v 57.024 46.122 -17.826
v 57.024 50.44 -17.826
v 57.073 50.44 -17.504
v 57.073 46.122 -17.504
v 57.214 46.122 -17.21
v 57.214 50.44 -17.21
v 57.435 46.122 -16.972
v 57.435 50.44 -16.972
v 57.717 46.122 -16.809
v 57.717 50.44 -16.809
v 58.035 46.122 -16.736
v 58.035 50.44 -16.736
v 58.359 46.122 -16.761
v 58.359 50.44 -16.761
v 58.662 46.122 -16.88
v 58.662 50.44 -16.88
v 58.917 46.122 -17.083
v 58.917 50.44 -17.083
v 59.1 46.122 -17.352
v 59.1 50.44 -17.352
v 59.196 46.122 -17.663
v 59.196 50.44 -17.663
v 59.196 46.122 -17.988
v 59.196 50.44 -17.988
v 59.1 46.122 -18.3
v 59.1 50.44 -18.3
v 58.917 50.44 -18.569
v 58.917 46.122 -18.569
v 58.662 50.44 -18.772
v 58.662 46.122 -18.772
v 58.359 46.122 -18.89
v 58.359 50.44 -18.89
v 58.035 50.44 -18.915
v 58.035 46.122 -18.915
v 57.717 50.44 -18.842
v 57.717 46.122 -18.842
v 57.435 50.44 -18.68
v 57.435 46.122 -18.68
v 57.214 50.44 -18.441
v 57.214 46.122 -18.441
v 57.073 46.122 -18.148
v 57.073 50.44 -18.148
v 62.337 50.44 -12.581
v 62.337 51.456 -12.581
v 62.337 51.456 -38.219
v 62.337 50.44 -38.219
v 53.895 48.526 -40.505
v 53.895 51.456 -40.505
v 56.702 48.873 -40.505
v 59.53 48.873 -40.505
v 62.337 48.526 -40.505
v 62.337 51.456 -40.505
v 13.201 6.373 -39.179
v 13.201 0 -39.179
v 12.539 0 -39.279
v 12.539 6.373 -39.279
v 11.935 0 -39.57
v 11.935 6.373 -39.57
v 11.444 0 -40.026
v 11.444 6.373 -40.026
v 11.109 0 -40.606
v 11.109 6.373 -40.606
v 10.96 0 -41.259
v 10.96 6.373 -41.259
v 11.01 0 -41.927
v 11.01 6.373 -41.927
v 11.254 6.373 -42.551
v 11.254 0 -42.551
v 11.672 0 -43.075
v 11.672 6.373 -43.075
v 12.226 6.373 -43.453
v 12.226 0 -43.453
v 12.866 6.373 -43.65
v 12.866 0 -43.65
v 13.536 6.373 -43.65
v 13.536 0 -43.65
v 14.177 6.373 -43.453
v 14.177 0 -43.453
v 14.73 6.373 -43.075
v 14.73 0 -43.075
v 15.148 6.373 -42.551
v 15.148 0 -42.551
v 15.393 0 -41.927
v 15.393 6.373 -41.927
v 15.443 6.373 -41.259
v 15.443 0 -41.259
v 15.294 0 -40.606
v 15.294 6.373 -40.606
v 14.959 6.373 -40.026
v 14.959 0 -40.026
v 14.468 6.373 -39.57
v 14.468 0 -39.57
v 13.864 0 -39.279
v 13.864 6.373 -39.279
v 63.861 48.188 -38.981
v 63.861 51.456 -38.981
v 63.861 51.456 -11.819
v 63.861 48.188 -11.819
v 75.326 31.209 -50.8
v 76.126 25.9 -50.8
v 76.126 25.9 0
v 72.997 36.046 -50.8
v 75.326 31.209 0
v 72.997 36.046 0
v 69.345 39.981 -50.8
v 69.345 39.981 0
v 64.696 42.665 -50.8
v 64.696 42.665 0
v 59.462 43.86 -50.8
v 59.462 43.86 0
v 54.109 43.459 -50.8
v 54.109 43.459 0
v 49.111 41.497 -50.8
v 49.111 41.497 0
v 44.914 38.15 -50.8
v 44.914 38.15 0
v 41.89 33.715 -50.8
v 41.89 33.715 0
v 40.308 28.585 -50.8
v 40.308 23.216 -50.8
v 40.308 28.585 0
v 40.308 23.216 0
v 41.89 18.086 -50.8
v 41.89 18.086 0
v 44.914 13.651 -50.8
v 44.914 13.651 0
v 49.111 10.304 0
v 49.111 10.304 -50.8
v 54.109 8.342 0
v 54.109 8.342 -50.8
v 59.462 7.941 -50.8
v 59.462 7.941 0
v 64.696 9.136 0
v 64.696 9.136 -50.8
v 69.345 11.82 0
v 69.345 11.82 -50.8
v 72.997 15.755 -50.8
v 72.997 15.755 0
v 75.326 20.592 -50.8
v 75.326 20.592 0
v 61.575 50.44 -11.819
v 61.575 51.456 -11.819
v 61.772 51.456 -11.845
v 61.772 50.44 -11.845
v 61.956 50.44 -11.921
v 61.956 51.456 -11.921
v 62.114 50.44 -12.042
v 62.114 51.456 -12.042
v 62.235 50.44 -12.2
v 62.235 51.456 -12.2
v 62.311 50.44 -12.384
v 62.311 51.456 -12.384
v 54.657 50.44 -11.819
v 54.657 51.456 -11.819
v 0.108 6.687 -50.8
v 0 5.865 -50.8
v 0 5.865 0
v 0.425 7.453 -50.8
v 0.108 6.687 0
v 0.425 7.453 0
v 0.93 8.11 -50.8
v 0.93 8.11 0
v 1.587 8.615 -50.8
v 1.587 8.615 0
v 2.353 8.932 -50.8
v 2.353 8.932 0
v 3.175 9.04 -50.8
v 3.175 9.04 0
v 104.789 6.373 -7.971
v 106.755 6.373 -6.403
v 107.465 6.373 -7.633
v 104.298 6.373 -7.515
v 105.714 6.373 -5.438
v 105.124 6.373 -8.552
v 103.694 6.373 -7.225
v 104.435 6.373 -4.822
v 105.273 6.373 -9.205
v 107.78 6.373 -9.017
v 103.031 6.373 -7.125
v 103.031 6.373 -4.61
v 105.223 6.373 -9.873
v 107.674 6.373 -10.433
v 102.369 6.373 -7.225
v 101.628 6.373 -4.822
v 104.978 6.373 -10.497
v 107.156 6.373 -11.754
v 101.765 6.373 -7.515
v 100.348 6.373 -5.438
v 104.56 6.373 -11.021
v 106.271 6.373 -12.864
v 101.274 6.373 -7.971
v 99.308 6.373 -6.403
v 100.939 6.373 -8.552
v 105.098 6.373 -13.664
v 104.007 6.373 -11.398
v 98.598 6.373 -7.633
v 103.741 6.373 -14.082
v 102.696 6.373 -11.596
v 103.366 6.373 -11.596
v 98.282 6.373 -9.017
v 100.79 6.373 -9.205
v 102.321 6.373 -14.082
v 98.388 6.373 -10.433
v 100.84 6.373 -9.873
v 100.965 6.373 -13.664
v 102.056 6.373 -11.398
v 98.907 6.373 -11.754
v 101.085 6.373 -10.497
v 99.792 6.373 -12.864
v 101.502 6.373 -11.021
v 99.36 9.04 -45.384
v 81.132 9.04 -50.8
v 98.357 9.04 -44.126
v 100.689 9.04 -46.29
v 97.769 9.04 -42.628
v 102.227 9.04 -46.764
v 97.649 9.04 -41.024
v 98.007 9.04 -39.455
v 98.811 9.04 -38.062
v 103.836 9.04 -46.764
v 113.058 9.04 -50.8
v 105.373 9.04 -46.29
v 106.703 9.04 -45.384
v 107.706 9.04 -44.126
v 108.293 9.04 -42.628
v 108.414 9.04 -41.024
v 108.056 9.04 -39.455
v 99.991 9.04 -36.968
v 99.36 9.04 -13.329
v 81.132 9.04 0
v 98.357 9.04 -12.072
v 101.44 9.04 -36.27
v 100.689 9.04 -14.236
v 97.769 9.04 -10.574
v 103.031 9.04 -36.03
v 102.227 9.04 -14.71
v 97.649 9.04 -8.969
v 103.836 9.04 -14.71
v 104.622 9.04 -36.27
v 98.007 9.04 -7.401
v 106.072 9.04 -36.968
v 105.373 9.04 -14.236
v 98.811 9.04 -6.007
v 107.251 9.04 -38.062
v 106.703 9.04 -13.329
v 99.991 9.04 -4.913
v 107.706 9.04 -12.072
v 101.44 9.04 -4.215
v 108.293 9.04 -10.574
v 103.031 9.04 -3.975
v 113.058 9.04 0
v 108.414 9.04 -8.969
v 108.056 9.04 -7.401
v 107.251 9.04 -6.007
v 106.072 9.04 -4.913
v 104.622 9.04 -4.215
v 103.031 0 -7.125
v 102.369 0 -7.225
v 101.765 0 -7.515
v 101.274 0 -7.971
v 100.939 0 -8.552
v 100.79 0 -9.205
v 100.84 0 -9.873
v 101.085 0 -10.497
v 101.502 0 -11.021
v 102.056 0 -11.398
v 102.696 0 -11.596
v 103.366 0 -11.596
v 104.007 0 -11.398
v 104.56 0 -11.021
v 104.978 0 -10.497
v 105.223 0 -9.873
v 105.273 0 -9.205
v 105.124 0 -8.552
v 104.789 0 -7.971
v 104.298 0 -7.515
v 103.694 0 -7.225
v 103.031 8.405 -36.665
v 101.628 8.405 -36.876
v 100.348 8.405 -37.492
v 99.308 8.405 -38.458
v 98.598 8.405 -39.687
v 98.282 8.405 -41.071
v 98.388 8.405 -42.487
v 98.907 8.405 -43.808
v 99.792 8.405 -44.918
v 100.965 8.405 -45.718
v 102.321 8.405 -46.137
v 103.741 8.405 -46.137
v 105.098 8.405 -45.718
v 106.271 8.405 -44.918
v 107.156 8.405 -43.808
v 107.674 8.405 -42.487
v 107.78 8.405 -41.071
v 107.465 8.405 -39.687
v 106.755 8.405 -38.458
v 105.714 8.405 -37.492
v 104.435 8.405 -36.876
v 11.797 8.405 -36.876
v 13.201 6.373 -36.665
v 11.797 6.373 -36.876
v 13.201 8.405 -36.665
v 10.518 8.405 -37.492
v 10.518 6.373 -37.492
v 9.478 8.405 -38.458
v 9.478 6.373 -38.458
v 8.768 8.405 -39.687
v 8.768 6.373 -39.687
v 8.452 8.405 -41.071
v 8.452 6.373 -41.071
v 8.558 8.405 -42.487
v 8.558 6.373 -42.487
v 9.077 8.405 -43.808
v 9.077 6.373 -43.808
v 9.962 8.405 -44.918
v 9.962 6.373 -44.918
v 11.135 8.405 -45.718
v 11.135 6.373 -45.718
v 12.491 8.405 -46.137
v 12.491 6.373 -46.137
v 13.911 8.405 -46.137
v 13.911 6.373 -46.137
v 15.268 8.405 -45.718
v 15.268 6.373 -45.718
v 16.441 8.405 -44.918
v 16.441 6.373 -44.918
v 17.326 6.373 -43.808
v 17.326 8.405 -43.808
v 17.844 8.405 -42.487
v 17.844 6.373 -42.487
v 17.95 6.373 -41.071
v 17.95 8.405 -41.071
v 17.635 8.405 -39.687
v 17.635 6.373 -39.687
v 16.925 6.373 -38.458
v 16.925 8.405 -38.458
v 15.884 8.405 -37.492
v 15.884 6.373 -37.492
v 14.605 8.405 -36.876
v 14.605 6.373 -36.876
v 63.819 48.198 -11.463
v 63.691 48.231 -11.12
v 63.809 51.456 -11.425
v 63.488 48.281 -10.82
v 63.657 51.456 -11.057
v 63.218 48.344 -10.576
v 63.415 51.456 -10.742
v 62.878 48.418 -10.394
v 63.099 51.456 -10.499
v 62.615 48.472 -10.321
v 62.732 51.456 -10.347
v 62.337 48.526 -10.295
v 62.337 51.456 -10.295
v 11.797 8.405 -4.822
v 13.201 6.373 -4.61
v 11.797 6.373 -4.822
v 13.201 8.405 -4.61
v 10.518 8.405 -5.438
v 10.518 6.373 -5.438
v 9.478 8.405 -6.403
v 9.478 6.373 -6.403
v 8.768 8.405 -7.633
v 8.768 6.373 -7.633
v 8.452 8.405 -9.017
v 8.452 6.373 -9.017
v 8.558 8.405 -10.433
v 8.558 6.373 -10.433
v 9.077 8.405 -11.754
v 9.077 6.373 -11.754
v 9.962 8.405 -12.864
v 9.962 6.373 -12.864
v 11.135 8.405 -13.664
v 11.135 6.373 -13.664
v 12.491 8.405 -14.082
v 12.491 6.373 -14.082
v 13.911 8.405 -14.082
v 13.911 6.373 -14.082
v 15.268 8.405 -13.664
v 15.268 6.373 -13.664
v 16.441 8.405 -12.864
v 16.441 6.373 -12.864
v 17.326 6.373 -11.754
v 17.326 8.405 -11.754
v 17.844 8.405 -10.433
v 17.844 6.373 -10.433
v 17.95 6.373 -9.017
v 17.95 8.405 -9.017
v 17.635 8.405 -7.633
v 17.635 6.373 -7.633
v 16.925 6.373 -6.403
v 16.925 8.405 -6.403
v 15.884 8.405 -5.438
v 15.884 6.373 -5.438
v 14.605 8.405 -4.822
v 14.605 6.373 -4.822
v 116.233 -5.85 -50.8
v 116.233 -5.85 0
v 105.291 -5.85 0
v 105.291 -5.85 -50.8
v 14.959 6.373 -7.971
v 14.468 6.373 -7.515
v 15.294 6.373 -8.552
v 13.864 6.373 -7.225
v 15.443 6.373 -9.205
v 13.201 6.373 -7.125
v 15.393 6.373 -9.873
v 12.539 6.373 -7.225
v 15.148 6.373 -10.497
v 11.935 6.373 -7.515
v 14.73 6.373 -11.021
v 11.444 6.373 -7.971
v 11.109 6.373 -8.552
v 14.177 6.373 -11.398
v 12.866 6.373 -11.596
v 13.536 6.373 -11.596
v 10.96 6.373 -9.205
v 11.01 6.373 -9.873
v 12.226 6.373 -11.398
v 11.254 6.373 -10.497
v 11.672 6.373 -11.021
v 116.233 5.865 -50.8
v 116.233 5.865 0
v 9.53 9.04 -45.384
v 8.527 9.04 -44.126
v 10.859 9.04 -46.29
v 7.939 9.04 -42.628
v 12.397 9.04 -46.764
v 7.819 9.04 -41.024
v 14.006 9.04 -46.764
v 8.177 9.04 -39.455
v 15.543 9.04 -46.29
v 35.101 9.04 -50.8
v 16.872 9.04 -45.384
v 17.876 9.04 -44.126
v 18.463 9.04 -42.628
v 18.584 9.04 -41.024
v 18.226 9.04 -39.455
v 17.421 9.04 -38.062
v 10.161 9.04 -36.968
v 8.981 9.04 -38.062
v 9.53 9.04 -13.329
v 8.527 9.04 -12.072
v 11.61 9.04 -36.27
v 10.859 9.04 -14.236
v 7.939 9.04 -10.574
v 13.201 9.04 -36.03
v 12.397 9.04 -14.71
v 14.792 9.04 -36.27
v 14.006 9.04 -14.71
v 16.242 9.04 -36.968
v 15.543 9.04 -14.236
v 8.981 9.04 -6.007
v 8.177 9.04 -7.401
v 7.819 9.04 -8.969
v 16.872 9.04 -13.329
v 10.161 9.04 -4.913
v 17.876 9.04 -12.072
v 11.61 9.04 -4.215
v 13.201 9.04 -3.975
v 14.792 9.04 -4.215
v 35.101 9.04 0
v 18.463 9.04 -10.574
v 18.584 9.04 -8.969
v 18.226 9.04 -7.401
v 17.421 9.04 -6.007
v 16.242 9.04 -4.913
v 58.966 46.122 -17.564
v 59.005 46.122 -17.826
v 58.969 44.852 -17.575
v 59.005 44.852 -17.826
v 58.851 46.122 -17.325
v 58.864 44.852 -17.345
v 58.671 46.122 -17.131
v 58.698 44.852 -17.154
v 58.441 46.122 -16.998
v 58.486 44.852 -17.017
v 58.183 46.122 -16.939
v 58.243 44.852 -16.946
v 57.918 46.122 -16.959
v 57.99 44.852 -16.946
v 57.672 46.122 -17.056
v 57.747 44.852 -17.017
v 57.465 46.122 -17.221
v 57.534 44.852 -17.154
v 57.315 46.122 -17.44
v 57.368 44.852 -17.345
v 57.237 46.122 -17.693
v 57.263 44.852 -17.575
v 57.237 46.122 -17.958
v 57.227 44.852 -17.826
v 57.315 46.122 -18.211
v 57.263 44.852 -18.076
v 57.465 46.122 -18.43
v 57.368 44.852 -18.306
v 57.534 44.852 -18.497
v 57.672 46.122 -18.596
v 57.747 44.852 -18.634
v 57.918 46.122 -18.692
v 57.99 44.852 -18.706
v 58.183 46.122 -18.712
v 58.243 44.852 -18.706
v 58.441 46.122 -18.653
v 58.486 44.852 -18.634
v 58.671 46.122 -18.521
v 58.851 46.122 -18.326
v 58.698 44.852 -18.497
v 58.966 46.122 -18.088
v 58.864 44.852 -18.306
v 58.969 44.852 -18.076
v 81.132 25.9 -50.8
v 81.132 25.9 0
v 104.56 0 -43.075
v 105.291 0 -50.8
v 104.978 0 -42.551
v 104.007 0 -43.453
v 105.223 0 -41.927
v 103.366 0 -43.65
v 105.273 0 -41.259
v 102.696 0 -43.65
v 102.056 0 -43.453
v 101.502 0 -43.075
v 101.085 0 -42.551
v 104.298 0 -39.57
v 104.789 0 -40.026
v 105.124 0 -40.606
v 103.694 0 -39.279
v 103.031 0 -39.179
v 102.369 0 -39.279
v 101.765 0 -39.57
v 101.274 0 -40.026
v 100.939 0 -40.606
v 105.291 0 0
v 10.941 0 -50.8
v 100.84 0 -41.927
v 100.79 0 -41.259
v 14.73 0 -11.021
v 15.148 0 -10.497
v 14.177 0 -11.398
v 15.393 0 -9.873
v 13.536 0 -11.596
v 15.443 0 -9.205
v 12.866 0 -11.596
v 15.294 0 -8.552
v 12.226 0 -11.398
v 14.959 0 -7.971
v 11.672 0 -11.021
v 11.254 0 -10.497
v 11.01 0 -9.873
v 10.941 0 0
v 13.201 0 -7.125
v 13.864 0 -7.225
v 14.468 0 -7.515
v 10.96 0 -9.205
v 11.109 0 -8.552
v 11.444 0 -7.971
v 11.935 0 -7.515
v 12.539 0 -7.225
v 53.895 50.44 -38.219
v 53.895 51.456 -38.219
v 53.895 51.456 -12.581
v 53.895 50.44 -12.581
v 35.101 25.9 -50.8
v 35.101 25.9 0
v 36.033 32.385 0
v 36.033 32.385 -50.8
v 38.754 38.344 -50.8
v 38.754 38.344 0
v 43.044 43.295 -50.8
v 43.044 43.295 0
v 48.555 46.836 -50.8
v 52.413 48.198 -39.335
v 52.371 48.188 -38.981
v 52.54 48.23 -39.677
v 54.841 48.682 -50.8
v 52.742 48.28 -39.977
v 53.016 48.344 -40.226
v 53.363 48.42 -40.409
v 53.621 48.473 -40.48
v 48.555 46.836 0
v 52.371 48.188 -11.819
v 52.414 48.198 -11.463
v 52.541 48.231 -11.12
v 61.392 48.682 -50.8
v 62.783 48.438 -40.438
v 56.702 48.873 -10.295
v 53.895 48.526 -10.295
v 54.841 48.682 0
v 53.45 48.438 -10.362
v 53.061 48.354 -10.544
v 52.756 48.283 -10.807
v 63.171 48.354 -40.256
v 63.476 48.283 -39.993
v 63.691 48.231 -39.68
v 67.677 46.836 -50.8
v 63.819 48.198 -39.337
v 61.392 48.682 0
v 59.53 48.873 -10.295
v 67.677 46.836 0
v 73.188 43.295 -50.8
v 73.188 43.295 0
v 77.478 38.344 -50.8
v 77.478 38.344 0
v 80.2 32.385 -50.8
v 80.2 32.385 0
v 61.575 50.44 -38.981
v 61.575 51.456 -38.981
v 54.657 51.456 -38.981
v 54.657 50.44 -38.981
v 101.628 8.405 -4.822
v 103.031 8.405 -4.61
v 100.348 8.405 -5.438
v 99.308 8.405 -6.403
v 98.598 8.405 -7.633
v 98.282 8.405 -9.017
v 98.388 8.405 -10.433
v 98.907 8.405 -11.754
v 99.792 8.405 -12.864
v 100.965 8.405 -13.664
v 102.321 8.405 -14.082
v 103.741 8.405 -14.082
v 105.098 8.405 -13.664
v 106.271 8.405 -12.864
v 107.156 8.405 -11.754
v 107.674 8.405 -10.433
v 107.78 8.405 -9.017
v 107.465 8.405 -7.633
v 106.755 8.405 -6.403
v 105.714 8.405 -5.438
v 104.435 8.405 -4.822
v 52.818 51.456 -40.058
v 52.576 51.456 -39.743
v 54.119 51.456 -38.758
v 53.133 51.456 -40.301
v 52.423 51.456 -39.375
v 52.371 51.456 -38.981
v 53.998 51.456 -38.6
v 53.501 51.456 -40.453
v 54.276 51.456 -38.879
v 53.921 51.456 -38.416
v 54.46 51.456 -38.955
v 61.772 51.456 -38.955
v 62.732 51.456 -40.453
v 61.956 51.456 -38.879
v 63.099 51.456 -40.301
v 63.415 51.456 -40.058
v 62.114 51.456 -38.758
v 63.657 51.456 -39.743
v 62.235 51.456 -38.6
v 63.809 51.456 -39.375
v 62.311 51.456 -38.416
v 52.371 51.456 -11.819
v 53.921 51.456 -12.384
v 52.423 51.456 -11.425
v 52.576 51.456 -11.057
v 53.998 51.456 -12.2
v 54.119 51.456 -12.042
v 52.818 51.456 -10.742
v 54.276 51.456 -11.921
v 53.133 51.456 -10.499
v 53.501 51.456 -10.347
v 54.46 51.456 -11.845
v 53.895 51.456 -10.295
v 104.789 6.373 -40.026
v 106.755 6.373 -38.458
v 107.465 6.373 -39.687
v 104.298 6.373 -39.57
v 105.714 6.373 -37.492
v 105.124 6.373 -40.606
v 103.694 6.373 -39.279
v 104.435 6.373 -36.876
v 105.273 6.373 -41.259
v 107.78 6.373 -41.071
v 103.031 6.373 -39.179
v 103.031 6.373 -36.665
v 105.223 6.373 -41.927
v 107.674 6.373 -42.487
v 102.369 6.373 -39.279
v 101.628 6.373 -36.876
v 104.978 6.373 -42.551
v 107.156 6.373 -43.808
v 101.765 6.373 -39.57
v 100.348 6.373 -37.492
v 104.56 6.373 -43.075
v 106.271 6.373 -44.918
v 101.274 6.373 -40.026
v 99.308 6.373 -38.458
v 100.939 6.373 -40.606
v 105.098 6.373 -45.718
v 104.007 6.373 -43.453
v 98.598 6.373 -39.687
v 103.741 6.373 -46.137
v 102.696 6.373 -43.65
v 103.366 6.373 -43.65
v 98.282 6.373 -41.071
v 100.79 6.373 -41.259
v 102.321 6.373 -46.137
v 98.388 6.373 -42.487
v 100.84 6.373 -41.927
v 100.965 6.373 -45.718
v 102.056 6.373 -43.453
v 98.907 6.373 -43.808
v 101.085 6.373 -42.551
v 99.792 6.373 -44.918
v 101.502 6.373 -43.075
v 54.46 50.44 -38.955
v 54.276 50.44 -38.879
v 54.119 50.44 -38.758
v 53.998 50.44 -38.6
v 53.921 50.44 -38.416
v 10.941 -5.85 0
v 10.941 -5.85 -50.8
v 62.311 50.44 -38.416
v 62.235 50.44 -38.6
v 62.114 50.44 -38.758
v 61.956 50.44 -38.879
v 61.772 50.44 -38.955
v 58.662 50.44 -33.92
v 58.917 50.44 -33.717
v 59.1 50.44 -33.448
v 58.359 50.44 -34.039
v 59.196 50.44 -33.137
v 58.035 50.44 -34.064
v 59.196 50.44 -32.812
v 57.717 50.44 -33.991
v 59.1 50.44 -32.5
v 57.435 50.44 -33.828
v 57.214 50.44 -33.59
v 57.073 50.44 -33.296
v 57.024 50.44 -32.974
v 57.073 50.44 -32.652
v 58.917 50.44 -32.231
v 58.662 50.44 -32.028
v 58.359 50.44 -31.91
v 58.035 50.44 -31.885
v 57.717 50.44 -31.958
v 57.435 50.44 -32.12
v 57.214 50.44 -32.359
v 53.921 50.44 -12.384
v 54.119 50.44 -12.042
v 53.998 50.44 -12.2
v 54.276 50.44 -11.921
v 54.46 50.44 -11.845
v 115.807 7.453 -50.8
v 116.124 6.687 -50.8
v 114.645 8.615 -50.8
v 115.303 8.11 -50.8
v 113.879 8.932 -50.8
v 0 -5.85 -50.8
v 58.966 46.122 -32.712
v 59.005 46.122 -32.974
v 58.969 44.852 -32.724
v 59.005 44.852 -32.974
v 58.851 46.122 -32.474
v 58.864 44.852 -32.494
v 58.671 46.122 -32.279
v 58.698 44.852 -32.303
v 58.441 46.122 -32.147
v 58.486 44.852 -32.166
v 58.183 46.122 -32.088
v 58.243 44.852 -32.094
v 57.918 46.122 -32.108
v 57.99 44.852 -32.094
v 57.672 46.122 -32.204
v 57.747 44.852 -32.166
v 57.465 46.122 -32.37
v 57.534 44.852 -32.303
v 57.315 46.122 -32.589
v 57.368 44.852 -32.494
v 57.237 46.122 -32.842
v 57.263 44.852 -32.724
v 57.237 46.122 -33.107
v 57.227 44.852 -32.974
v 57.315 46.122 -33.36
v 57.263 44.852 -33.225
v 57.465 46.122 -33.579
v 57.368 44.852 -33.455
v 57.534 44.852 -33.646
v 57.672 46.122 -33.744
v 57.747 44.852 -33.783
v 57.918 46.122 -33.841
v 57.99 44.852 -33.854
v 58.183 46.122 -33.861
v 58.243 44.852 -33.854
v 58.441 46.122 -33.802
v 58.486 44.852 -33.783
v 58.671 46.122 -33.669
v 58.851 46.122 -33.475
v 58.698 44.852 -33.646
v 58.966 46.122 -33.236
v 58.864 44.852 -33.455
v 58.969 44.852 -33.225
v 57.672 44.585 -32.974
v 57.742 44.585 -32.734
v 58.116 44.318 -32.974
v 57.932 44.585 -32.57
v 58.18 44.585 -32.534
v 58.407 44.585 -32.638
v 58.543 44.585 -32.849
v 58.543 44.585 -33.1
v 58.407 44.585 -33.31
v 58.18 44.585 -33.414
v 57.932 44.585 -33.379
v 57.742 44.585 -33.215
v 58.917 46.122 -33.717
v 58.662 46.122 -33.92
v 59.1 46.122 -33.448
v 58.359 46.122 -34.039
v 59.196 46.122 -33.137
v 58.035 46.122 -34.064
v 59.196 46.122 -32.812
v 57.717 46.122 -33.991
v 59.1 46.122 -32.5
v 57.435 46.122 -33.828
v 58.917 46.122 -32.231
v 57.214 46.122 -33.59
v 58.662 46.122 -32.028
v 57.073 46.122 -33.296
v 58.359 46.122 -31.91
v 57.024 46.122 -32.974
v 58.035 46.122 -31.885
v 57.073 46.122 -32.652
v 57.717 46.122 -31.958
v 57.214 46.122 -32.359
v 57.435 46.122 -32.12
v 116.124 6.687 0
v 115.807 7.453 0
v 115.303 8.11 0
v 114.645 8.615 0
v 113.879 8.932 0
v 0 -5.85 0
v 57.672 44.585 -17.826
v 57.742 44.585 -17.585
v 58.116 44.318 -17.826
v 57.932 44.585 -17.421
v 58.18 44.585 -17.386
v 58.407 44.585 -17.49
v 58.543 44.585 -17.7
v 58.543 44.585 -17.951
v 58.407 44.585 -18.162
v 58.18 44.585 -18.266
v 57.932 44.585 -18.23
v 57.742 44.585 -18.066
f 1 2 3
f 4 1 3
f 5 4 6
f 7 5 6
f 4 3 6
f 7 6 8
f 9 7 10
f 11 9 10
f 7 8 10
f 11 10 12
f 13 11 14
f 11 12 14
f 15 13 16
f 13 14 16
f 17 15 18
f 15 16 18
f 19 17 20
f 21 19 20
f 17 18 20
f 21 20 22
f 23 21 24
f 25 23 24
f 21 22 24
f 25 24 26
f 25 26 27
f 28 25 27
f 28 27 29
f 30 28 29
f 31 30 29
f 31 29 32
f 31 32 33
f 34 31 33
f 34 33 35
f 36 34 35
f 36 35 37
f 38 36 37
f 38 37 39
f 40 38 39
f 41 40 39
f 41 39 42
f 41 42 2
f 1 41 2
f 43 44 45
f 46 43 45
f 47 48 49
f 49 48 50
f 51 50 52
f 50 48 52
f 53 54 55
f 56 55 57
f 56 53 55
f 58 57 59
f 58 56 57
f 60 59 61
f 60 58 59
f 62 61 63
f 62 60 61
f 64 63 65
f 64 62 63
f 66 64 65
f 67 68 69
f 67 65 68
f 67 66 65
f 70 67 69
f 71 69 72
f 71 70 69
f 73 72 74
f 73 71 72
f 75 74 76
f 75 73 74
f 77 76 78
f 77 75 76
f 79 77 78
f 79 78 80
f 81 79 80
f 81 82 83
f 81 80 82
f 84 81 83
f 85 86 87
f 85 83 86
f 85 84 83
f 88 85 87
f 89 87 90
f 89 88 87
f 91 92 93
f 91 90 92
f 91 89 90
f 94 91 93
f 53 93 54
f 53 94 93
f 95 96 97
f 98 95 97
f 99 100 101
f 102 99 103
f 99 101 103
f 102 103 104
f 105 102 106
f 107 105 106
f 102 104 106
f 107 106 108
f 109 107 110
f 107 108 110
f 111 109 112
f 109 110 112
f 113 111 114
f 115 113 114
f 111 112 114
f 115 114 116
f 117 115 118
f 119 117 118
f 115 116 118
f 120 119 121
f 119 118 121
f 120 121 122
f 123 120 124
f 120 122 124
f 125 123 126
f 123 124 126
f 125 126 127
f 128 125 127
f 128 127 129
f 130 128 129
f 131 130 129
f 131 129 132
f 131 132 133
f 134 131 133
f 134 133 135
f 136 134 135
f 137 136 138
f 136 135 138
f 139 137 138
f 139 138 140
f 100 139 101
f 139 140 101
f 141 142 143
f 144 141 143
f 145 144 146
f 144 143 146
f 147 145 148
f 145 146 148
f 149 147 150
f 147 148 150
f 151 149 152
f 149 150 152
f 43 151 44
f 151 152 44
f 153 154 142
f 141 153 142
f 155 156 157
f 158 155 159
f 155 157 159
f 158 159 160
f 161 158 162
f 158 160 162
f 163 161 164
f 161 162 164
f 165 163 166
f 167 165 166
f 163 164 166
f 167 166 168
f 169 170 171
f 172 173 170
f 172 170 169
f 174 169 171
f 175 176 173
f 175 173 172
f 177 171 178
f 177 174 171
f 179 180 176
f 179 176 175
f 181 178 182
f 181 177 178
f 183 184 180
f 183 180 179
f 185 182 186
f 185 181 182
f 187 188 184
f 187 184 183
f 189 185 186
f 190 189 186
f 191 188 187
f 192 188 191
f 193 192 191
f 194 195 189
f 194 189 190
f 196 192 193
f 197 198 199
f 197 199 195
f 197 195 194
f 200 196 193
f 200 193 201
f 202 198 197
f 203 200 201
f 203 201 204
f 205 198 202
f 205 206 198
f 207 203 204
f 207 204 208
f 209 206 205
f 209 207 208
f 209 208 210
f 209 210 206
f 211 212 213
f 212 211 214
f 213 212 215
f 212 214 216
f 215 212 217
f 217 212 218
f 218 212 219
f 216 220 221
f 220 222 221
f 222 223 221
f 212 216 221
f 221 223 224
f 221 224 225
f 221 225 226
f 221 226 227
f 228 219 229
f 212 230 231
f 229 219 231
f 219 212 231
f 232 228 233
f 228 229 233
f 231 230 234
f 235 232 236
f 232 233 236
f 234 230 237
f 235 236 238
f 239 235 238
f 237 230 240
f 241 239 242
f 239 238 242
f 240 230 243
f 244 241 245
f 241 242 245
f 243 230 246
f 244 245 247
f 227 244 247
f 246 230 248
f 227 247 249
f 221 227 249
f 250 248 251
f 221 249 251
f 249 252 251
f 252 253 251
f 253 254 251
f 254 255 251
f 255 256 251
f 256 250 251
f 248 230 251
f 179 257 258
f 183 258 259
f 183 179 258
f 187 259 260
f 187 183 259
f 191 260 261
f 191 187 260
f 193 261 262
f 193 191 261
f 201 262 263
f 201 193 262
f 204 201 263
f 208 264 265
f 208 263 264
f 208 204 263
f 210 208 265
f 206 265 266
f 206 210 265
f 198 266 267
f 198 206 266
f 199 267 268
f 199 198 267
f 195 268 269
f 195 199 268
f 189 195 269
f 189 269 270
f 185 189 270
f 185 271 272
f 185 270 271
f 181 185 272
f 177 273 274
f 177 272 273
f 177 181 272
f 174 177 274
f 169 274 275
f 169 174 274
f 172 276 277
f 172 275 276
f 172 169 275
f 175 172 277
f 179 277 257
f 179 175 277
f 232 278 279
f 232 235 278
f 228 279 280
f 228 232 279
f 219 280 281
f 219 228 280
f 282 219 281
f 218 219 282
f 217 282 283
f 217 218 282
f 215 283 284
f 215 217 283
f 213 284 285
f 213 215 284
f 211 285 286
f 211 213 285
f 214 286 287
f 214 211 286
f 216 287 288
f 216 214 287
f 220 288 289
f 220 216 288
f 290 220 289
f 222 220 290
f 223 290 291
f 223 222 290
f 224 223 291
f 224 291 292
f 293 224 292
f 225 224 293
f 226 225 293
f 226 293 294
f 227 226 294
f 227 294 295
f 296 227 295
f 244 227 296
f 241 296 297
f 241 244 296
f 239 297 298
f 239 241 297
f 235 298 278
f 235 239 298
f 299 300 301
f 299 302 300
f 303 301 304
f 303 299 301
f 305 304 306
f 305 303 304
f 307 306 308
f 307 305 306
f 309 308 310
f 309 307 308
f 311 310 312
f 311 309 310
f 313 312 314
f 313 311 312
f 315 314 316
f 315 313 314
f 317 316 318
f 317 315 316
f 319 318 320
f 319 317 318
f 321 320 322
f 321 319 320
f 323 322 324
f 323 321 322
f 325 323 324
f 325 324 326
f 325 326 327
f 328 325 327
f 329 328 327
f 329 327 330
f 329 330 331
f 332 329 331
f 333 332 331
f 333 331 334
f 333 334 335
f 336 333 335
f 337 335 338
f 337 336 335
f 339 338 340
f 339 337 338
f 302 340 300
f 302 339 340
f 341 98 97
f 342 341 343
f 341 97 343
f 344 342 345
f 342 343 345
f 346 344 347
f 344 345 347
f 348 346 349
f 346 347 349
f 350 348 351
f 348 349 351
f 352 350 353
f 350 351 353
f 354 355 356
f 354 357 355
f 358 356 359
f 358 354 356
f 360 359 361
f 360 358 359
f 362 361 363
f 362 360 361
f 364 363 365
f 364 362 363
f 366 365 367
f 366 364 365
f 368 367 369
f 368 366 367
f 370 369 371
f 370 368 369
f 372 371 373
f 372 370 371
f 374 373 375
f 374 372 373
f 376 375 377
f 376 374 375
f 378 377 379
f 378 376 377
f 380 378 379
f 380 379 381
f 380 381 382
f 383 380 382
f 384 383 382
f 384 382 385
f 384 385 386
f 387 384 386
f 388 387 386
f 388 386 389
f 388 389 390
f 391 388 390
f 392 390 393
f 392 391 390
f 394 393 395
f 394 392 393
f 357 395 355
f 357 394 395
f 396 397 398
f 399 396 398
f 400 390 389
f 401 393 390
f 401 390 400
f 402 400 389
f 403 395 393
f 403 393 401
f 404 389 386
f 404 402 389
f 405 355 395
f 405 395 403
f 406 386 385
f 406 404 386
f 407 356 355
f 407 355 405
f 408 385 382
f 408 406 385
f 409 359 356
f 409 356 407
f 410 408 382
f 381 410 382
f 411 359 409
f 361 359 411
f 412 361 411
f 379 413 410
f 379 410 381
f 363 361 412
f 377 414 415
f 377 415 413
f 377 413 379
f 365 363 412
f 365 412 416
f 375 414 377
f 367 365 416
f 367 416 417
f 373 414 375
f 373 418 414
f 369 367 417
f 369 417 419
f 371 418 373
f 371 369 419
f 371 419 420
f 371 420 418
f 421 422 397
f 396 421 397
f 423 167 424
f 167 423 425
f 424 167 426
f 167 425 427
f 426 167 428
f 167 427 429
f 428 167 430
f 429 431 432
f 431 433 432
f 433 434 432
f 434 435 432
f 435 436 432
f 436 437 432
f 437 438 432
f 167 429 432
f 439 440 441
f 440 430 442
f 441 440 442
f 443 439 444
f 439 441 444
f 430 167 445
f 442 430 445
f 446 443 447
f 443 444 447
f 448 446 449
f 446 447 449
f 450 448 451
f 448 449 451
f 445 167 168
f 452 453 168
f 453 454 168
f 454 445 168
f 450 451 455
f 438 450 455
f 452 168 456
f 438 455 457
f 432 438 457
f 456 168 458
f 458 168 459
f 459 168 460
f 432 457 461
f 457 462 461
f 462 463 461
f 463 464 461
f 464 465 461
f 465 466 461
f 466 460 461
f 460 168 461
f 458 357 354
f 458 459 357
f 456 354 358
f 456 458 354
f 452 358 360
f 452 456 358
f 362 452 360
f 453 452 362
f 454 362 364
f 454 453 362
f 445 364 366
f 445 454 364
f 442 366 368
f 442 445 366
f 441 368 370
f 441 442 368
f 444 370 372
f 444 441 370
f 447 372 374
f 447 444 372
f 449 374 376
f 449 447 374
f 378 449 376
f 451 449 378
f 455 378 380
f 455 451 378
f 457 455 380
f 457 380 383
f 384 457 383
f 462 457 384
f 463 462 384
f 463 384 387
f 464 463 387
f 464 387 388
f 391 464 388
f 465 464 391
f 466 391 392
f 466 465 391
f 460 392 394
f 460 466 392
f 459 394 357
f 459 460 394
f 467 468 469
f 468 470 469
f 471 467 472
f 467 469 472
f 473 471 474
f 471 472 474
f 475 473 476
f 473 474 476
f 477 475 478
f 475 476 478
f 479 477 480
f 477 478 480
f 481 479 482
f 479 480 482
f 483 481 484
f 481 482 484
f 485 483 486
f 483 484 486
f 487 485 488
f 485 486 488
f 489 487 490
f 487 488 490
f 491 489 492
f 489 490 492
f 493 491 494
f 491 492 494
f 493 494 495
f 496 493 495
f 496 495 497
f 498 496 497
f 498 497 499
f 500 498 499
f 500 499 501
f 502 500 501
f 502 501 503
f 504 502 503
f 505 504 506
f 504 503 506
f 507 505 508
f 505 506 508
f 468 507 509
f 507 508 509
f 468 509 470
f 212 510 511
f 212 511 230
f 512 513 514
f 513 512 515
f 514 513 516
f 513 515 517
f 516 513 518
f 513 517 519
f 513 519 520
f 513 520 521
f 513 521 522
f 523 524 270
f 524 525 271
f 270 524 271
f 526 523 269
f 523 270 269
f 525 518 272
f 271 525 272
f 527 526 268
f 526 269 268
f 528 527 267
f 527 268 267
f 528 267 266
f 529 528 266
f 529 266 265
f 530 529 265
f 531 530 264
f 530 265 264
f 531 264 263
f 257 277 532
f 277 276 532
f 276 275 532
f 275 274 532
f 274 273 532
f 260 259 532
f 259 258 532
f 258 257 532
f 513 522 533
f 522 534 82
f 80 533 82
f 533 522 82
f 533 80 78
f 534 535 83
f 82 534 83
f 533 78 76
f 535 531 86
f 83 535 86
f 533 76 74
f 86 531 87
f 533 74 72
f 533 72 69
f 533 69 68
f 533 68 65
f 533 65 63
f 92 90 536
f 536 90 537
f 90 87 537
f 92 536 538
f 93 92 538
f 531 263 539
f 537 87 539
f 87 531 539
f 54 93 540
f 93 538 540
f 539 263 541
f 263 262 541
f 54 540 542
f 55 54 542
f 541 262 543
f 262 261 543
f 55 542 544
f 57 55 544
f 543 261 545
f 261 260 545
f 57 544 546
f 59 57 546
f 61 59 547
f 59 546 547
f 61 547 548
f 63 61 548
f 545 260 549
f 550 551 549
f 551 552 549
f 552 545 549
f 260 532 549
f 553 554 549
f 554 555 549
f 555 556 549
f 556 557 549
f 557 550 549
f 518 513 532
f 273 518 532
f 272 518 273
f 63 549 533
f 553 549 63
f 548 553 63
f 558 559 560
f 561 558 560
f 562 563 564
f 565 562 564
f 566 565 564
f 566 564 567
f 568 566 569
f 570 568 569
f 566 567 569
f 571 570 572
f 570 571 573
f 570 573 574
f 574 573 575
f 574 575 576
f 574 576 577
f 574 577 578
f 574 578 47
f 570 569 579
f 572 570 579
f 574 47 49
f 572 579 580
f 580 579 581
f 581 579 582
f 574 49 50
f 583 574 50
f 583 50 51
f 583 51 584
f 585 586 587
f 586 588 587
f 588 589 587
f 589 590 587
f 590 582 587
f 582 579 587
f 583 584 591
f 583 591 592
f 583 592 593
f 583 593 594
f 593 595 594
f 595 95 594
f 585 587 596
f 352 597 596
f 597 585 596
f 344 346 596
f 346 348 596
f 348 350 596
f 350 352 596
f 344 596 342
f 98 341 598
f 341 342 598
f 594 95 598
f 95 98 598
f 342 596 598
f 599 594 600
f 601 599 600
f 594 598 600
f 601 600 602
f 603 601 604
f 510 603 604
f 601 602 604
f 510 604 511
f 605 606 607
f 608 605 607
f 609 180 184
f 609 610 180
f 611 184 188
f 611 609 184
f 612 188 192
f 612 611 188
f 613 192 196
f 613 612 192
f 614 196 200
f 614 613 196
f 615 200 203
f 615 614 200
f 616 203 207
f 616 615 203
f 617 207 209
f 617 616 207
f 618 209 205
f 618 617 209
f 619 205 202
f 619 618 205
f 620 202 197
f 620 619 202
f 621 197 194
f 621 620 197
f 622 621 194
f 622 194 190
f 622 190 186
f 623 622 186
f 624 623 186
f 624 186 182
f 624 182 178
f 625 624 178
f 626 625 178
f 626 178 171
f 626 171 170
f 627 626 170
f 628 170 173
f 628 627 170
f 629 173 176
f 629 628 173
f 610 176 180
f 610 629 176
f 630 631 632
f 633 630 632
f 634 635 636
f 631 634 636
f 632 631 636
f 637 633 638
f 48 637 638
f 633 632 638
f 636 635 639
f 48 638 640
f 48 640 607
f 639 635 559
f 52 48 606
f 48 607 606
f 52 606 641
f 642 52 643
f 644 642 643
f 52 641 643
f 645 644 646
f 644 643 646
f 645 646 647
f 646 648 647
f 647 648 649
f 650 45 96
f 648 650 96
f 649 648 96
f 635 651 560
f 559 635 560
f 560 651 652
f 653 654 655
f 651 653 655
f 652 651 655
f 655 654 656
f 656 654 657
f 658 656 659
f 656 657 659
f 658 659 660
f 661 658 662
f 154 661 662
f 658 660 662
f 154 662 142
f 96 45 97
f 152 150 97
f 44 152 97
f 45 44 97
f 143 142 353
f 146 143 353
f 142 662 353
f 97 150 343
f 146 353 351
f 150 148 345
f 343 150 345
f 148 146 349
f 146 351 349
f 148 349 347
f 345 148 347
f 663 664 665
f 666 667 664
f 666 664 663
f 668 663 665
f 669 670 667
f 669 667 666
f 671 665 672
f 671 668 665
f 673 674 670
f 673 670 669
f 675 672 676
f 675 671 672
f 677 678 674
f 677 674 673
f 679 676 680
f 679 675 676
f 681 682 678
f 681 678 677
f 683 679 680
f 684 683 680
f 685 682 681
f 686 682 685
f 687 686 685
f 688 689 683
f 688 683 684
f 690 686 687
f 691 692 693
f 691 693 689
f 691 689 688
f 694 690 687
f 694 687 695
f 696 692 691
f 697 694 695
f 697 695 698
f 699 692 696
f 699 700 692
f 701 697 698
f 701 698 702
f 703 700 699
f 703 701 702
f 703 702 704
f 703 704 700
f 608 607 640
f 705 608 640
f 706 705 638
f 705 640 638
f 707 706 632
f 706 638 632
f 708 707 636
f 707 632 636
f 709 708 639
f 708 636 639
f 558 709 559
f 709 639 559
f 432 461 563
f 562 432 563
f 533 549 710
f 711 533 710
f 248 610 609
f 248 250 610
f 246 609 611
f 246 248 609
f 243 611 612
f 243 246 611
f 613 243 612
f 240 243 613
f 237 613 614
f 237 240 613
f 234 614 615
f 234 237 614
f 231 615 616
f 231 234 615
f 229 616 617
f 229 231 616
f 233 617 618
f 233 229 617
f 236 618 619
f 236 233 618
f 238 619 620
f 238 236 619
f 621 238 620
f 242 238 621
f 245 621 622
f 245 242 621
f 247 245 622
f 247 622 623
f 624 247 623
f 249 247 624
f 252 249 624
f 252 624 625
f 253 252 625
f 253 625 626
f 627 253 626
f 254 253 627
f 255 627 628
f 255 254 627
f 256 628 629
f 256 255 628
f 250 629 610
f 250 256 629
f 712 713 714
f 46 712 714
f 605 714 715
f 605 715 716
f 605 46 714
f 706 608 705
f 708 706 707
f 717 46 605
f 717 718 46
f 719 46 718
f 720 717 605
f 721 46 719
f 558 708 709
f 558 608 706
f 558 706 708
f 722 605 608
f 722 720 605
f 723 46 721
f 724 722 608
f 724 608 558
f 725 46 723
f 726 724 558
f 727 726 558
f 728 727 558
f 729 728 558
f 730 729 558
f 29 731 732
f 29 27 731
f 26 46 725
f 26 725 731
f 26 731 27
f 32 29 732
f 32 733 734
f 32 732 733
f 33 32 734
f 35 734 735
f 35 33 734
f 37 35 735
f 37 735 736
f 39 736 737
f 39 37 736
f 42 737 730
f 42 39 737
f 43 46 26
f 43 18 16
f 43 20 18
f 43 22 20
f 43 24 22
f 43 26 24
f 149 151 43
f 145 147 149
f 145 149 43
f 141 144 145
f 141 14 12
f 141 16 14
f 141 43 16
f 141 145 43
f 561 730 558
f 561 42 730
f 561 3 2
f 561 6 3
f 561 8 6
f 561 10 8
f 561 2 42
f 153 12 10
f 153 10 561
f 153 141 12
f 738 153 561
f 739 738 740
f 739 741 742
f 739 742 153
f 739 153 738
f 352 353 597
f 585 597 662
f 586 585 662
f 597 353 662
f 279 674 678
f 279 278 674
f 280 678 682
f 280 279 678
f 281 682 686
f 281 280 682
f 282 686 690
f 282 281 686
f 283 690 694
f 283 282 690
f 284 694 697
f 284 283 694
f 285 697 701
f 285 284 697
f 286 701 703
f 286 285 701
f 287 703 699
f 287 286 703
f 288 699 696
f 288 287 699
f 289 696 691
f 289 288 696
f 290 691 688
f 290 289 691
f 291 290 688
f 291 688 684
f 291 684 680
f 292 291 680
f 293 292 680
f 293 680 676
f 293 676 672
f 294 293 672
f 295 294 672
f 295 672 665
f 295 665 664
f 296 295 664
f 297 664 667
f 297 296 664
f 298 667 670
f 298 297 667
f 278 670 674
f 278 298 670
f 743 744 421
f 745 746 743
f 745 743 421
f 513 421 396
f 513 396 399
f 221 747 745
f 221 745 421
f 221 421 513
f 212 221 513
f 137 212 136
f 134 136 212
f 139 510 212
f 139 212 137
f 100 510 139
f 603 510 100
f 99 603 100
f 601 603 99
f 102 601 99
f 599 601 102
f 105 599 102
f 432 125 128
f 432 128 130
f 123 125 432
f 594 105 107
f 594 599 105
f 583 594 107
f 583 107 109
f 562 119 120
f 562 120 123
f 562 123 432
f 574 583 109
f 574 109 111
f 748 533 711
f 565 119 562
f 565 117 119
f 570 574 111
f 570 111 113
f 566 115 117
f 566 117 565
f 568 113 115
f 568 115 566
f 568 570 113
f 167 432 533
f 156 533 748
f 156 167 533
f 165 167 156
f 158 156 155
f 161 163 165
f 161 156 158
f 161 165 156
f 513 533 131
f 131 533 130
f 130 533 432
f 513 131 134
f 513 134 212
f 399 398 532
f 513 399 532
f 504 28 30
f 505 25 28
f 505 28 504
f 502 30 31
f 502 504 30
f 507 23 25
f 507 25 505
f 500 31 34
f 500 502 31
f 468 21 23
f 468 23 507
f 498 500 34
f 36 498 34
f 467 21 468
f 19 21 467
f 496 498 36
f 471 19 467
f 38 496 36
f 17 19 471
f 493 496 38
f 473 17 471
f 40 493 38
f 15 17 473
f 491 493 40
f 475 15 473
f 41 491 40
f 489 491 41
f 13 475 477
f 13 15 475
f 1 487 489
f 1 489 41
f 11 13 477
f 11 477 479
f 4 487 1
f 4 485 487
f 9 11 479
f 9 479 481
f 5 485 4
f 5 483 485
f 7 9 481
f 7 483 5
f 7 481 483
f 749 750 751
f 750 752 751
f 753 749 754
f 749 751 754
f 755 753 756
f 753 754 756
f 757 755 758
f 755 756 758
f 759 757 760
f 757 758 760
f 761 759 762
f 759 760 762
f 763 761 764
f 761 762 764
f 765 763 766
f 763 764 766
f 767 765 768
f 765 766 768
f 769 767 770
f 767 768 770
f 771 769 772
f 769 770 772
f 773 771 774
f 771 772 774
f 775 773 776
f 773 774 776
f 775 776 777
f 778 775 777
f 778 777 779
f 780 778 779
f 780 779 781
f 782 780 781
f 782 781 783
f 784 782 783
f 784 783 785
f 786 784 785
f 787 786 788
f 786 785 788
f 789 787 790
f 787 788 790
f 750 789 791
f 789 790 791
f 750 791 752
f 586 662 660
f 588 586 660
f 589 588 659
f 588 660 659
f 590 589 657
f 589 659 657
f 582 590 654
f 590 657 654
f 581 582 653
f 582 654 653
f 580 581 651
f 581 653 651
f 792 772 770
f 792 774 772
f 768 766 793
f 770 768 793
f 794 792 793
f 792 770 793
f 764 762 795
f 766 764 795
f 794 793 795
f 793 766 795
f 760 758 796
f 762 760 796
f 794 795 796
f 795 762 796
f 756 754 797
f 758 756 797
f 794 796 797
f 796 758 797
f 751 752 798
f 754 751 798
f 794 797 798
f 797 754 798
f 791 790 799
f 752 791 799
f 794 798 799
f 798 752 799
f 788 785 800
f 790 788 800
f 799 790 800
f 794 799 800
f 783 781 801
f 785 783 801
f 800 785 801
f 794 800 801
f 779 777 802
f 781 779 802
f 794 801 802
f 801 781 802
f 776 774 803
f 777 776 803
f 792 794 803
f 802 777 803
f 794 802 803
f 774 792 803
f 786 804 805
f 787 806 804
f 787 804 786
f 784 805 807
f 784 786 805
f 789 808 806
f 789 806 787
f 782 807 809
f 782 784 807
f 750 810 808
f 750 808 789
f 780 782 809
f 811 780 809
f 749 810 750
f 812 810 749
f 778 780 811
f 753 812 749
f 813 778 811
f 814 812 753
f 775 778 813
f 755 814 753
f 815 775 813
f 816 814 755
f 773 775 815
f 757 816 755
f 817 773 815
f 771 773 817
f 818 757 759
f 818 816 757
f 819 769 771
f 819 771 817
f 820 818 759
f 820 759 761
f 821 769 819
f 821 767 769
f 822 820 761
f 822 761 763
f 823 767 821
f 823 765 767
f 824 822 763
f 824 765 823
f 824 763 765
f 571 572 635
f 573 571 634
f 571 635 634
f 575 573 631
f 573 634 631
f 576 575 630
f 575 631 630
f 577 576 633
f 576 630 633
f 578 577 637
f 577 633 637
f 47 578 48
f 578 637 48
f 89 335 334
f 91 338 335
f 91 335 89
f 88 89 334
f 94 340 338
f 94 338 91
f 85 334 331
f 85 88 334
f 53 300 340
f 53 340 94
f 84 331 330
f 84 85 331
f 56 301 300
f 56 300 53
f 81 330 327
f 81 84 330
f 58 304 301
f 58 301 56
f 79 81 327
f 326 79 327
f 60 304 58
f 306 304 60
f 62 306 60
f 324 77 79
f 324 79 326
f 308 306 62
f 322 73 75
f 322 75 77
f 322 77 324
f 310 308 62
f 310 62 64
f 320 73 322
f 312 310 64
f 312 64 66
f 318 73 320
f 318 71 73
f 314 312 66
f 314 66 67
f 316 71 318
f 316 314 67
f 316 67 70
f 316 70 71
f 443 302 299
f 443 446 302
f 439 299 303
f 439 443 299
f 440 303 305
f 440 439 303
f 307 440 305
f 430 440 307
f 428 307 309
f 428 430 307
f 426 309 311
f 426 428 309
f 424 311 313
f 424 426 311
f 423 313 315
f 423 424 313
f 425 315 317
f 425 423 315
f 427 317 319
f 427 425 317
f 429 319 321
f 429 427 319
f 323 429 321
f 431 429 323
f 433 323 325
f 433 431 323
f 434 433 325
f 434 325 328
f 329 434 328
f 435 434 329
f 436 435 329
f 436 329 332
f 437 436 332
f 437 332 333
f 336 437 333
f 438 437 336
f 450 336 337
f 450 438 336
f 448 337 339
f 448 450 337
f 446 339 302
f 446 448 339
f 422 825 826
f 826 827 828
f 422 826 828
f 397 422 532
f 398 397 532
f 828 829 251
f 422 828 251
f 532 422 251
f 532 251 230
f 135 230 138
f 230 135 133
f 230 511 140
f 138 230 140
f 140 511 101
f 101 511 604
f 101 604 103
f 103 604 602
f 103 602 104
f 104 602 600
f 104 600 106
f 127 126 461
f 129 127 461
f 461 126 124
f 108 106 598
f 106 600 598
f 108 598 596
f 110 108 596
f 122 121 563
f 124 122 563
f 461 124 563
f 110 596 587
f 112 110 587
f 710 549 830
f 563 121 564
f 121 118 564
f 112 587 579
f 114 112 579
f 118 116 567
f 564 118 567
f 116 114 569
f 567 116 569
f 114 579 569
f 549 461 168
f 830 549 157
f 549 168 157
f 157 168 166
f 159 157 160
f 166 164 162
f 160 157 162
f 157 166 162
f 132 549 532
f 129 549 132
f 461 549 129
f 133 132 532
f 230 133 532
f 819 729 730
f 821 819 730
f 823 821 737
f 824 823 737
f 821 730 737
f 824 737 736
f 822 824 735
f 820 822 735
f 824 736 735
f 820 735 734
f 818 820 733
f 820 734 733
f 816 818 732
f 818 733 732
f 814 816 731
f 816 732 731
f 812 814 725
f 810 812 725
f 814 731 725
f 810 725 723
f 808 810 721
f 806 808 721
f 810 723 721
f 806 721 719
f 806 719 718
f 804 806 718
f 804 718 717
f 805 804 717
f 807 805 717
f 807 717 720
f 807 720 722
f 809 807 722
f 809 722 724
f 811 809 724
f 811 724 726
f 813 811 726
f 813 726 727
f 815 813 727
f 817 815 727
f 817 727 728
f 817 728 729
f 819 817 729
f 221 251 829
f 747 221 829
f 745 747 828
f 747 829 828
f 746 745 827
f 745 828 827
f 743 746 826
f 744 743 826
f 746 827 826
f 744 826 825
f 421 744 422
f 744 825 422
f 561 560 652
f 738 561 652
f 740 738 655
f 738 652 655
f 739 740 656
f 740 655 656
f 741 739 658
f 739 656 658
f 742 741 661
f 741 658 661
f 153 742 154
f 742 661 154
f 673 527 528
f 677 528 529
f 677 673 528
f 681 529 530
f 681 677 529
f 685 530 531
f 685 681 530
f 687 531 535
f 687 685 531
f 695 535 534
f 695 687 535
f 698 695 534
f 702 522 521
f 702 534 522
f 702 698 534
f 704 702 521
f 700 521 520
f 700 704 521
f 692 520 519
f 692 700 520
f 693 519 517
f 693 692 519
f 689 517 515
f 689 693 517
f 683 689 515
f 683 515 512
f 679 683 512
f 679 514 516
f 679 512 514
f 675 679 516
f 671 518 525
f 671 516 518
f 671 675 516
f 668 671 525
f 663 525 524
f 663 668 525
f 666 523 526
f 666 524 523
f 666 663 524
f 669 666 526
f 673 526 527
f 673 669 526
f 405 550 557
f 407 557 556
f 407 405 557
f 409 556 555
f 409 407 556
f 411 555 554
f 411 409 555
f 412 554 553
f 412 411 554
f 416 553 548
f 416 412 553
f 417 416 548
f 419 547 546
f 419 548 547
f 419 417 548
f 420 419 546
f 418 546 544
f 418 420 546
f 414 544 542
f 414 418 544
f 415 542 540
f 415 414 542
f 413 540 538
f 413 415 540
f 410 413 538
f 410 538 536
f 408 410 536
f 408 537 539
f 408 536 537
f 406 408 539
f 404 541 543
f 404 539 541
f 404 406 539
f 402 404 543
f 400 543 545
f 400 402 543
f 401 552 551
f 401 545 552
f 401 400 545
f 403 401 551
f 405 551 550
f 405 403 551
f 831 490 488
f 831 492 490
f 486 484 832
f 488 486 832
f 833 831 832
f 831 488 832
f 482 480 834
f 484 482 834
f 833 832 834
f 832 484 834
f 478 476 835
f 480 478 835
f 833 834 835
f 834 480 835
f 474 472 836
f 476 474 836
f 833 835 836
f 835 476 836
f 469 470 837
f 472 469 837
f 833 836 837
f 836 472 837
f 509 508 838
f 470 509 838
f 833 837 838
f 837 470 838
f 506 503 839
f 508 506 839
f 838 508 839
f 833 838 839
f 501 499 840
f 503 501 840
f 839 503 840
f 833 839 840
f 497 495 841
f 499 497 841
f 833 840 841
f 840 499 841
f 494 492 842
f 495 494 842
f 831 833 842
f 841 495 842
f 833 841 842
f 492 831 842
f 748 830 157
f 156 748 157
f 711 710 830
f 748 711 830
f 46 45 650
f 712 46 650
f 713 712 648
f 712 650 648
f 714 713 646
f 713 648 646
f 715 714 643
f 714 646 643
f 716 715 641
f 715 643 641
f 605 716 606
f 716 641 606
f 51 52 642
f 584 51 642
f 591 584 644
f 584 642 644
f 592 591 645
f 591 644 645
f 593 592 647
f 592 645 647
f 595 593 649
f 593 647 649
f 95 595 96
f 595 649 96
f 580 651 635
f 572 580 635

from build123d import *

# Parameters (mm, degrees)
SKETCH1_R                                   = 18.009689256
EXTRUDE1_DEPTH                              = 50.8
EXTRUDE2_REACH                              = 141.193
EXTRUDE2_END_RADIUS                         = 23.015630095
SKETCH3_OUTSIDE_W                           = 146.071
SKETCH3_OUTSIDE_H                           = 80.638
EXTRUDE3_DEPTH                              = 1.016
F_2_64_TAPPED_HOLE1_D                       = 1.778
F_2_64_TAPPED_HOLE1_DEPTH                   = 5.588
F_2_64_TAPPED_HOLE1_CBORE_D                 = 2.1844
F_2_64_TAPPED_HOLE1_CBORE_DEPTH             = 4.318
F_2_64_TAPPED_HOLE1_TIP                     = 0.53416509
CBORE_FOR_8_BINDING_HEAD_MACHINE_SC_2_COUNT = 2
CBORE_FOR_8_BINDING_HEAD_MACHINE_SC_2_PITCH = 32.054466339
CBORE_FOR_8_BINDING_HEAD_MACHINE_SC_3_COUNT = 2
CBORE_FOR_8_BINDING_HEAD_MACHINE_SC_3_PITCH = 89.830079482
CBORE_FOR_8_BINDING_HEAD_MACHINE_SC_4_COUNT = 2
CBORE_FOR_8_BINDING_HEAD_MACHINE_SC_4_PITCH = 95.377838055


with BuildPart() as part:
    # Sketch1 → Extrude1 (new body)
    with BuildSketch(Plane.XY):
        with BuildLine():
            Line((81.131890127, 9.040147783), (113.057520064, 9.040147783))
            ThreePointArc((113.057520064, 9.040147783), (115.302584094, 8.110211814), (116.232520064, 5.865147783))
            Line((116.232520064, 5.865147783), (116.232520064, 0))
            Line((116.232520064, 0), (116.232520064, -5.849507389))
            Line((116.232520064, -5.849507389), (105.291133005, -5.849507389))
            Line((105.291133005, -5.849507389), (105.291133005, 0))
            Line((105.291133005, 0), (10.941387059, 0))
            Line((10.941387059, 0), (10.941387059, -5.849507389))
            Line((10.941387059, -5.849507389), (0, -5.849507389))
            Line((0, -5.849507389), (0, 0))
            Line((0, 0), (0, 5.865147783))
            ThreePointArc((0, 5.865147783), (0.92993597, 8.110211814), (3.175, 9.040147783))
            Line((3.175, 9.040147783), (35.100629937, 9.040147783))
            Line((35.100629937, 9.040147783), (35.100629937, 25.900492611))
            ThreePointArc((35.100629937, 25.900492611), (58.116260032, 48.916122706), (81.131890127, 25.900492611))
            Line((81.131890127, 25.900492611), (81.131890127, 9.040147783))
        make_face()
        with Locations((58.116260032, 25.900492611)):
            Circle(SKETCH1_R, mode=Mode.SUBTRACT)
    extrude(amount=-EXTRUDE1_DEPTH)

    # Extrude2: up to this cylinder (the profile starts outside it)
    extrude2_end = Plane(origin=(58.116260032, 25.900492611, -25.4), z_dir=(0, 0, 1)) * Cylinder(EXTRUDE2_END_RADIUS, 329.41726019, mode=Mode.PRIVATE)
    # Sketch2 → Extrude2 (add, up to the surface)
    with BuildSketch(Plane(origin=(0, 51.456122706, 0), x_dir=(-1, 0, 0), z_dir=(0, 1, 0)), mode=Mode.PRIVATE) as extrude2_sk1:
        with BuildLine():
            Line((-62.33707365, -10.295164467), (-53.895446414, -10.295164467))
            ThreePointArc((-53.895446414, -10.295164467), (-52.81781568, -10.741533732), (-52.371446414, -11.819164467))
            Line((-52.371446414, -11.819164467), (-52.371446414, -38.980835533))
            ThreePointArc((-52.371446414, -38.980835533), (-52.81781568, -40.058466268), (-53.895446414, -40.504835533))
            Line((-53.895446414, -40.504835533), (-62.33707365, -40.504835533))
            ThreePointArc((-62.33707365, -40.504835533), (-63.414704384, -40.058466268), (-63.86107365, -38.980835533))
            Line((-63.86107365, -38.980835533), (-63.86107365, -11.819164467))
            ThreePointArc((-63.86107365, -11.819164467), (-63.414704384, -10.741533732), (-62.33707365, -10.295164467))
        make_face()
    extrude2_tool1 = extrude(extrude2_sk1.sketch, amount=-EXTRUDE2_REACH, mode=Mode.PRIVATE) - extrude2_end
    add(extrude2_tool1.solids().sort_by_distance((58.11626, 51.456123, -25.4))[0])

    # Sketch3 outside → Extrude3 (cut)
    # profile 1 of 2: a face of its own
    with BuildSketch(Plane(origin=(0, 51.456122706, 0), x_dir=(-1, 0, 0), z_dir=(0, 1, 0))):
        with Locations((-58.1165, -25.4)):
            Rectangle(SKETCH3_OUTSIDE_W, SKETCH3_OUTSIDE_H)
        with BuildLine():
            Line((-63.86107365, -11.819164467), (-63.86107365, -38.980835533))
            ThreePointArc((-63.86107365, -38.980835533), (-63.414704384, -40.058466268), (-62.33707365, -40.504835533))
            Line((-62.33707365, -40.504835533), (-53.895446414, -40.504835533))
            ThreePointArc((-53.895446414, -40.504835533), (-52.81781568, -40.058466268), (-52.371446414, -38.980835533))
            Line((-52.371446414, -38.980835533), (-52.371446414, -11.819164467))
            ThreePointArc((-52.371446414, -11.819164467), (-52.81781568, -10.741533732), (-53.895446414, -10.295164467))
            Line((-53.895446414, -10.295164467), (-62.33707365, -10.295164467))
            ThreePointArc((-62.33707365, -10.295164467), (-63.414704384, -10.741533732), (-63.86107365, -11.819164467))
        make_face(mode=Mode.SUBTRACT)
    # profile 2 of 2: a face of its own
    with BuildSketch(Plane(origin=(0, 51.456122706, 0), x_dir=(-1, 0, 0), z_dir=(0, 1, 0))):
        with BuildLine():
            Line((-54.657446414, -11.819164467), (-61.57507365, -11.819164467))
            ThreePointArc((-61.57507365, -11.819164467), (-62.113889017, -12.0423491), (-62.33707365, -12.581164467))
            Line((-62.33707365, -12.581164467), (-62.33707365, -38.218835533))
            ThreePointArc((-62.33707365, -38.218835533), (-62.113889017, -38.7576509), (-61.57507365, -38.980835533))
            Line((-61.57507365, -38.980835533), (-54.657446414, -38.980835533))
            ThreePointArc((-54.657446414, -38.980835533), (-54.118631047, -38.7576509), (-53.895446414, -38.218835533))
            Line((-53.895446414, -38.218835533), (-53.895446414, -12.581164467))
            ThreePointArc((-53.895446414, -12.581164467), (-54.118631047, -12.0423491), (-54.657446414, -11.819164467))
        make_face()
    extrude(amount=-EXTRUDE3_DEPTH, mode=Mode.SUBTRACT)

    # #2-64 Tapped Hole1
    with Locations(Plane(origin=(0, 50.440122706, 0), x_dir=(-1, 0, 0), z_dir=(0, 1, 0))):
        with Locations((-58.116260032, -17.825633593), (-58.116260032, -32.974366407)):
            CounterBoreHole(F_2_64_TAPPED_HOLE1_D / 2, F_2_64_TAPPED_HOLE1_CBORE_D / 2, F_2_64_TAPPED_HOLE1_CBORE_DEPTH, depth=F_2_64_TAPPED_HOLE1_DEPTH)
            with Locations((0, 0, -(F_2_64_TAPPED_HOLE1_DEPTH + F_2_64_TAPPED_HOLE1_TIP / 2))):  # 118° drill point
                Cone(0, F_2_64_TAPPED_HOLE1_D / 2, F_2_64_TAPPED_HOLE1_TIP, mode=Mode.SUBTRACT)

    # Sketch8 → CBORE for #8 Binding Head Machine Screw1 (revolve, cut)
    with BuildSketch(Plane(origin=(103.031299773, 9.040147783, -9.372766831), x_dir=(0, 0, 1), z_dir=(1, 0, 0))):
        Polygon((0, 0), (0, 14.889655172), (2.2479, 14.889655172), (2.2479, 2.667), (4.7625, 2.667), (4.7625, 0.635), (5.3975, 0), align=None)
    cbore_for_8_binding_head_machine_screw1 = revolve(axis=Axis((103.031299773, 15.390147783, -9.372766831), (0, -1, 0)), mode=Mode.SUBTRACT)

    # CBORE for _8 Binding Head Machine Sc 2: CBORE for #8 Binding Head Machine Screw1 ×2
    with Locations(*[(0, 0, -i * CBORE_FOR_8_BINDING_HEAD_MACHINE_SC_2_PITCH) for i in range(1, CBORE_FOR_8_BINDING_HEAD_MACHINE_SC_2_COUNT)]):
        add(cbore_for_8_binding_head_machine_screw1, mode=Mode.SUBTRACT)

    # CBORE for _8 Binding Head Machine Sc 3: CBORE for #8 Binding Head Machine Screw1 ×2
    with Locations(*[(-i * CBORE_FOR_8_BINDING_HEAD_MACHINE_SC_3_PITCH, 0, 0) for i in range(1, CBORE_FOR_8_BINDING_HEAD_MACHINE_SC_3_COUNT)]):
        add(cbore_for_8_binding_head_machine_screw1, mode=Mode.SUBTRACT)

    # CBORE for _8 Binding Head Machine Sc 4: CBORE for #8 Binding Head Machine Screw1 ×2
    with Locations(*[Vector(-0.941833882106029, 0, -0.33607876832237826) * (i * CBORE_FOR_8_BINDING_HEAD_MACHINE_SC_4_PITCH) for i in range(1, CBORE_FOR_8_BINDING_HEAD_MACHINE_SC_4_COUNT)]):
        add(cbore_for_8_binding_head_machine_screw1, mode=Mode.SUBTRACT)


solid = part.part
